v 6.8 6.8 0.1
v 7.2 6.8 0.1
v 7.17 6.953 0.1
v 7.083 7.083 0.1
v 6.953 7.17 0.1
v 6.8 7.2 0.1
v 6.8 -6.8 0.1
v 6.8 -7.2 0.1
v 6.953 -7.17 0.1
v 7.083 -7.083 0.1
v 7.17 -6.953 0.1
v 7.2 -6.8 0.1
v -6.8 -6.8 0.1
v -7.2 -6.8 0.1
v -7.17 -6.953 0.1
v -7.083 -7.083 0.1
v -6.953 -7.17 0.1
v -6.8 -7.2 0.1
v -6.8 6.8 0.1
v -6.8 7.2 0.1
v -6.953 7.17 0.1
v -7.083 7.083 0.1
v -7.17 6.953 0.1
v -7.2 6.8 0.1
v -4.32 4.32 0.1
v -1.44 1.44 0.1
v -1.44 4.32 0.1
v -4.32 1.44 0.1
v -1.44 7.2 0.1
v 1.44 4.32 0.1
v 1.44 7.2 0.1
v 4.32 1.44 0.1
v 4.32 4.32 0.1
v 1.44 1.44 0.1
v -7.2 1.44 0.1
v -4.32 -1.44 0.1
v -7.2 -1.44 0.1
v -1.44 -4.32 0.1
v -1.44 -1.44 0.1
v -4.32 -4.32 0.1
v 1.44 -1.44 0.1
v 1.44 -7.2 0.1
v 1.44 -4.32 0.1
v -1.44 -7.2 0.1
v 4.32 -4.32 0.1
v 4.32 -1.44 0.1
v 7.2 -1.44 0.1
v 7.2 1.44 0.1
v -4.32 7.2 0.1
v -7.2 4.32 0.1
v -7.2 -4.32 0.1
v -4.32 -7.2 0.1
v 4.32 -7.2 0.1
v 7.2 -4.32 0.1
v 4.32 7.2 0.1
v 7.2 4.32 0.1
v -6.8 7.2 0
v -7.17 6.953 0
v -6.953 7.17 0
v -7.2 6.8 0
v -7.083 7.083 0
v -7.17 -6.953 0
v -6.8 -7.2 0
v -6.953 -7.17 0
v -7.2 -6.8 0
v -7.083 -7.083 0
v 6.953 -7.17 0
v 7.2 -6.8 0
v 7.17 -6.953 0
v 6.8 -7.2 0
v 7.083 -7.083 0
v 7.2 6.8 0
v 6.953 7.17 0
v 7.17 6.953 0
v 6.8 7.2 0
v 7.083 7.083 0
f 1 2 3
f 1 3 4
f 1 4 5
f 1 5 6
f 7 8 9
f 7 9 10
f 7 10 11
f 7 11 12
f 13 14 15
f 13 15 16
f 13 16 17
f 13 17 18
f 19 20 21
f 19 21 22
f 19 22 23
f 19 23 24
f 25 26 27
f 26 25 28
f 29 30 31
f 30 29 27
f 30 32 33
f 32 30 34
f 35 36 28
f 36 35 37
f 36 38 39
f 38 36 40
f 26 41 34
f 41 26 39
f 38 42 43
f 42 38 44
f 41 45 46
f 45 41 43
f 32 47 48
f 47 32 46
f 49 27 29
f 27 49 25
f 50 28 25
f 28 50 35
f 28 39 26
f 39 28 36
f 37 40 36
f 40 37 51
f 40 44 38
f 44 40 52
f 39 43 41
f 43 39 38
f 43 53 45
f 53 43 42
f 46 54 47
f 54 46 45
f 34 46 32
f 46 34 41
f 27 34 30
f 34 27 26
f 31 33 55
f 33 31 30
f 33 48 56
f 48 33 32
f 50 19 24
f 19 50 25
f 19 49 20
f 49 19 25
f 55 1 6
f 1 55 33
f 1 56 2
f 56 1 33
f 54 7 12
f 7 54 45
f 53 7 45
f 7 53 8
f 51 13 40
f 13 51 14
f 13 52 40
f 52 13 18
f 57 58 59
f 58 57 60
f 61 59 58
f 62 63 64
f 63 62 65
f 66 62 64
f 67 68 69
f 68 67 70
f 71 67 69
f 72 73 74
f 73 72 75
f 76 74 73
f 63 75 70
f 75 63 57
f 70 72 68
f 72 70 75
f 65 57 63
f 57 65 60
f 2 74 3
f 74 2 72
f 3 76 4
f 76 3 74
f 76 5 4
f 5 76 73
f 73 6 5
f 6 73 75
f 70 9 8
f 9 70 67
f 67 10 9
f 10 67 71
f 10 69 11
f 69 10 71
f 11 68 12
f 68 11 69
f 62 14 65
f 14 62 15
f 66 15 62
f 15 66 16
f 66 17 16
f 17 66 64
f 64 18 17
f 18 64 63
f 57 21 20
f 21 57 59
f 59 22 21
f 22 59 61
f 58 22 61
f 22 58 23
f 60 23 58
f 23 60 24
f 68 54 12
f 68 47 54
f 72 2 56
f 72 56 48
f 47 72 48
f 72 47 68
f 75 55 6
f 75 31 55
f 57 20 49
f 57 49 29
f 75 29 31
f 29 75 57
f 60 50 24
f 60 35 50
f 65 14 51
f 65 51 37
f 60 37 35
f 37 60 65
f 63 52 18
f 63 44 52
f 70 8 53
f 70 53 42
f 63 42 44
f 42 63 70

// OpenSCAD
// file: ../p/1-4disc.scad
use <../lib.scad>
function ldraw_lib__1_4disc() = [
// 0 Disc 0.25
// 0 Name: 1-4disc.dat
// 0 Author: James Jessiman
// 0 !LDRAW_ORG Primitive UPDATE 2002-02
// 0 !LICENSE Licensed under CC BY 4.0 : see CAreadme.txt
// 
// 0 BFC CERTIFY CCW
  [0,"BFC","CERTIFY"],
  [0,"BFC","CCW"],
// 
// 0 !HISTORY 2002-03-23 [sbliss] Added BFC statement.
// 0 !HISTORY 2002-04-25 [PTadmin] Official Update 2002-02
// 0 !HISTORY 2007-06-22 [PTadmin] Header formatted for Contributor Agreement
// 0 !HISTORY 2008-07-01 [PTadmin] Official Update 2008-01
// 
// 
// 3 16 0 0 0 1 0 0 0.9239 0 0.3827
  [3,16,0,0,0,1,0,0,0.9239,0,0.3827],
// 3 16 0 0 0 0.9239 0 0.3827 0.7071 0 0.7071
  [3,16,0,0,0,0.9239,0,0.3827,0.7071,0,0.7071],
// 3 16 0 0 0 0.7071 0 0.7071 0.3827 0 0.9239
  [3,16,0,0,0,0.7071,0,0.7071,0.3827,0,0.9239],
// 3 16 0 0 0 0.3827 0 0.9239 0 0 1
  [3,16,0,0,0,0.3827,0,0.9239,0,0,1],
// 0
];
module ldraw_lib__1_4disc(step=0, col=false, unit=2/5, alt=false, line=0.2, solid=!$preview)
    makepoly(ldraw_lib__1_4disc(), step=step, col=col, unit=unit, alt=alt, line=line, solid=solid);
ldraw_lib__1_4disc(line=0.2);
// file: ../p/1-4cyli.scad
use <../lib.scad>
function ldraw_lib__1_4cyli() = [
// 0 Cylinder 0.25
// 0 Name: 1-4cyli.dat
// 0 Author: James Jessiman
// 0 !LDRAW_ORG Primitive UPDATE 2012-01
// 0 !LICENSE Licensed under CC BY 4.0 : see CAreadme.txt
// 
// 0 BFC CERTIFY CCW
  [0,"BFC","CERTIFY"],
  [0,"BFC","CCW"],
// 
// 0 !HISTORY 2002-03-23 [sbliss] Added BFC statement.
// 0 !HISTORY 2002-04-25 [PTadmin] Official Update 2002-02
// 0 !HISTORY 2007-06-22 [PTadmin] Header formatted for Contributor Agreement
// 0 !HISTORY 2008-07-01 [PTadmin] Official Update 2008-01
// 0 !HISTORY 2012-02-16 [Philo] Changed to CCW
// 0 !HISTORY 2012-03-30 [PTadmin] Official Update 2012-01
// 
// 
// 4 16 1 1 0 0.9239 1 0.3827 0.9239 0 0.3827 1 0 0
  [4,16,1,1,0,0.9239,1,0.3827,0.9239,0,0.3827,1,0,0],
// 5 24 1 0 0 1 1 0 0.9239 0 0.3827 1 0 -1
  [5,24,1,0,0,1,1,0,0.9239,0,0.3827,1,0,-1],
// 4 16 0.9239 1 0.3827 0.7071 1 0.7071 0.7071 0 0.7071 0.9239 0 0.3827
  [4,16,0.9239,1,0.3827,0.7071,1,0.7071,0.7071,0,0.7071,0.9239,0,0.3827],
// 5 24 0.9239 0 0.3827 0.9239 1 0.3827 0.7071 0 0.7071 1 0 0
  [5,24,0.9239,0,0.3827,0.9239,1,0.3827,0.7071,0,0.7071,1,0,0],
// 4 16 0.7071 1 0.7071 0.3827 1 0.9239 0.3827 0 0.9239 0.7071 0 0.7071
  [4,16,0.7071,1,0.7071,0.3827,1,0.9239,0.3827,0,0.9239,0.7071,0,0.7071],
// 5 24 0.7071 0 0.7071 0.7071 1 0.7071 0.3827 0 0.9239 0.9239 0 0.3827
  [5,24,0.7071,0,0.7071,0.7071,1,0.7071,0.3827,0,0.9239,0.9239,0,0.3827],
// 4 16 0.3827 1 0.9239 0 1 1 0 0 1 0.3827 0 0.9239
  [4,16,0.3827,1,0.9239,0,1,1,0,0,1,0.3827,0,0.9239],
// 5 24 0.3827 0 0.9239 0.3827 1 0.9239 0 0 1 0.7071 0 0.7071
  [5,24,0.3827,0,0.9239,0.3827,1,0.9239,0,0,1,0.7071,0,0.7071],
// 5 24 0 0 1 0 1 1 0.3827 0 0.9239 -1 0 1
  [5,24,0,0,1,0,1,1,0.3827,0,0.9239,-1,0,1],
];
module ldraw_lib__1_4cyli(step=0, col=false, unit=2/5, alt=false, line=0.2, solid=!$preview)
    makepoly(ldraw_lib__1_4cyli(), step=step, col=col, unit=unit, alt=alt, line=line, solid=solid);
ldraw_lib__1_4cyli(line=0.2);
// file: ../p/1-4chrd.scad
use <../lib.scad>
function ldraw_lib__1_4chrd() = [
// 0 Chord 0.25
// 0 Name: 1-4chrd.dat
// 0 Author: Tony Hafner [hafhead]
// 0 !LDRAW_ORG Primitive UPDATE 2012-02
// 0 !LICENSE Licensed under CC BY 2.0 and CC BY 4.0 : see CAreadme.txt
// 
// 0 BFC CERTIFY CCW
  [0,"BFC","CERTIFY"],
  [0,"BFC","CCW"],
// 
// 0 !HISTORY 2004-04-22 [PTadmin] Official Update 2004-02
// 0 !HISTORY 2007-10-09 [PTadmin] Header formatted for Contributor Agreement
// 0 !HISTORY 2008-07-01 [PTadmin] Official Update 2008-01
// 0 !HISTORY 2012-08-02 [MMR1988] Re-creation with PrimGen2 and Rectifier
// 0 !HISTORY 2012-08-09 [PTadmin] Official Update 2012-02
// 
// 
// 4 16 0.9239 0 0.3827 0.3827 0 0.9239 0 0 1 1 0 0
  [4,16,0.9239,0,0.3827,0.3827,0,0.9239,0,0,1,1,0,0],
// 3 16 0.7071 0 0.7071 0.3827 0 0.9239 0.9239 0 0.3827
  [3,16,0.7071,0,0.7071,0.3827,0,0.9239,0.9239,0,0.3827],
];
module ldraw_lib__1_4chrd(step=0, col=false, unit=2/5, alt=false, line=0.2, solid=!$preview)
    makepoly(ldraw_lib__1_4chrd(), step=step, col=col, unit=unit, alt=alt, line=line, solid=solid);
ldraw_lib__1_4chrd(line=0.2);
// main file
use <../lib.scad>
use <../p/1-4chrd.scad>
use <../p/1-4cyli.scad>
use <../p/1-4disc.scad>
function ldraw_lib__4624296a() = [
// 0 Sticker  1.8 x  1.8 with Black and White Squares
// 0 Name: 4624296a.dat
// 0 Author: Damien Roux [Darats]
// 0 !LDRAW_ORG Part UPDATE 2017-01
// 0 !LICENSE Licensed under CC BY 4.0 : see CAreadme.txt
// 
// 0 BFC CERTIFY CCW
  [0,"BFC","CERTIFY"],
  [0,"BFC","CCW"],
// 
// 0 !KEYWORDS Cars, Disney, Set 8206
// 
// 0 !HISTORY 2014-06-21 [PTadmin] Official Update 2014-01
// 0 !HISTORY 2017-07-03 [cwdee] Use cylinder primitives with conditional lines
// 0 !HISTORY 2017-12-30 [PTadmin] Official Update 2017-01
// 
// 
// 1 0 17 -0.25 17 1 0 0 0 1 0 0 0 1 1-4disc.dat
  [1,0,17,-0.25,17,1,0,0,0,1,0,0,0,1, ldraw_lib__1_4disc()],
// 1 0 17 -0.25 -17 0 0 1 0 1 0 -1 0 0 1-4disc.dat
  [1,0,17,-0.25,-17,0,0,1,0,1,0,-1,0,0, ldraw_lib__1_4disc()],
// 1 0 -17 -0.25 -17 -1 0 0 0 1 0 0 0 -1 1-4disc.dat
  [1,0,-17,-0.25,-17,-1,0,0,0,1,0,0,0,-1, ldraw_lib__1_4disc()],
// 1 0 -17 -0.25 17 0 0 -1 0 1 0 1 0 0 1-4disc.dat
  [1,0,-17,-0.25,17,0,0,-1,0,1,0,1,0,0, ldraw_lib__1_4disc()],
// 
// 4 0 -3.6 -0.25 10.8 -10.8 -0.25 10.8 -10.8 -0.25 3.6 -3.6 -0.25 3.6
  [4,0,-3.6,-0.25,10.8,-10.8,-0.25,10.8,-10.8,-0.25,3.6,-3.6,-0.25,3.6],
// 4 0 3.6 -0.25 18 -3.6 -0.25 18 -3.6 -0.25 10.8 3.6 -0.25 10.8
  [4,0,3.6,-0.25,18,-3.6,-0.25,18,-3.6,-0.25,10.8,3.6,-0.25,10.8],
// 4 0 10.8 -0.25 10.8 3.6 -0.25 10.8 3.6 -0.25 3.6 10.8 -0.25 3.6
  [4,0,10.8,-0.25,10.8,3.6,-0.25,10.8,3.6,-0.25,3.6,10.8,-0.25,3.6],
// 4 0 -10.8 -0.25 3.6 -18 -0.25 3.6 -18 -0.25 -3.6 -10.8 -0.25 -3.6
  [4,0,-10.8,-0.25,3.6,-18,-0.25,3.6,-18,-0.25,-3.6,-10.8,-0.25,-3.6],
// 4 0 -3.6 -0.25 -3.6 -10.8 -0.25 -3.6 -10.8 -0.25 -10.8 -3.6 -0.25 -10.8
  [4,0,-3.6,-0.25,-3.6,-10.8,-0.25,-3.6,-10.8,-0.25,-10.8,-3.6,-0.25,-10.8],
// 4 0 3.6 -0.25 3.6 -3.6 -0.25 3.6 -3.6 -0.25 -3.6 3.6 -0.25 -3.6
  [4,0,3.6,-0.25,3.6,-3.6,-0.25,3.6,-3.6,-0.25,-3.6,3.6,-0.25,-3.6],
// 4 0 3.6 -0.25 -10.8 -3.6 -0.25 -10.8 -3.6 -0.25 -18 3.6 -0.25 -18
  [4,0,3.6,-0.25,-10.8,-3.6,-0.25,-10.8,-3.6,-0.25,-18,3.6,-0.25,-18],
// 4 0 10.8 -0.25 -3.6 3.6 -0.25 -3.6 3.6 -0.25 -10.8 10.8 -0.25 -10.8
  [4,0,10.8,-0.25,-3.6,3.6,-0.25,-3.6,3.6,-0.25,-10.8,10.8,-0.25,-10.8],
// 4 0 18 -0.25 3.6 10.8 -0.25 3.6 10.8 -0.25 -3.6 18 -0.25 -3.6
  [4,0,18,-0.25,3.6,10.8,-0.25,3.6,10.8,-0.25,-3.6,18,-0.25,-3.6],
// 4 15 -3.6 -0.25 18 -10.8 -0.25 18 -10.8 -0.25 10.8 -3.6 -0.25 10.8
  [4,15,-3.6,-0.25,18,-10.8,-0.25,18,-10.8,-0.25,10.8,-3.6,-0.25,10.8],
// 4 15 -10.8 -0.25 10.8 -18 -0.25 10.8 -18 -0.25 3.6 -10.8 -0.25 3.6
  [4,15,-10.8,-0.25,10.8,-18,-0.25,10.8,-18,-0.25,3.6,-10.8,-0.25,3.6],
// 4 15 -3.6 -0.25 3.6 -10.8 -0.25 3.6 -10.8 -0.25 -3.6 -3.6 -0.25 -3.6
  [4,15,-3.6,-0.25,3.6,-10.8,-0.25,3.6,-10.8,-0.25,-3.6,-3.6,-0.25,-3.6],
// 4 15 -10.8 -0.25 -3.6 -18 -0.25 -3.6 -18 -0.25 -10.8 -10.8 -0.25 -10.8
  [4,15,-10.8,-0.25,-3.6,-18,-0.25,-3.6,-18,-0.25,-10.8,-10.8,-0.25,-10.8],
// 4 15 -3.6 -0.25 -10.8 -10.8 -0.25 -10.8 -10.8 -0.25 -18 -3.6 -0.25 -18
  [4,15,-3.6,-0.25,-10.8,-10.8,-0.25,-10.8,-10.8,-0.25,-18,-3.6,-0.25,-18],
// 4 15 3.6 -0.25 -3.6 -3.6 -0.25 -3.6 -3.6 -0.25 -10.8 3.6 -0.25 -10.8
  [4,15,3.6,-0.25,-3.6,-3.6,-0.25,-3.6,-3.6,-0.25,-10.8,3.6,-0.25,-10.8],
// 4 15 10.8 -0.25 -10.8 3.6 -0.25 -10.8 3.6 -0.25 -18 10.8 -0.25 -18
  [4,15,10.8,-0.25,-10.8,3.6,-0.25,-10.8,3.6,-0.25,-18,10.8,-0.25,-18],
// 4 15 18 -0.25 -3.6 10.8 -0.25 -3.6 10.8 -0.25 -10.8 18 -0.25 -10.8
  [4,15,18,-0.25,-3.6,10.8,-0.25,-3.6,10.8,-0.25,-10.8,18,-0.25,-10.8],
// 4 15 10.8 -0.25 3.6 3.6 -0.25 3.6 3.6 -0.25 -3.6 10.8 -0.25 -3.6
  [4,15,10.8,-0.25,3.6,3.6,-0.25,3.6,3.6,-0.25,-3.6,10.8,-0.25,-3.6],
// 4 15 3.6 -0.25 10.8 -3.6 -0.25 10.8 -3.6 -0.25 3.6 3.6 -0.25 3.6
  [4,15,3.6,-0.25,10.8,-3.6,-0.25,10.8,-3.6,-0.25,3.6,3.6,-0.25,3.6],
// 4 15 10.8 -0.25 18 3.6 -0.25 18 3.6 -0.25 10.8 10.8 -0.25 10.8
  [4,15,10.8,-0.25,18,3.6,-0.25,18,3.6,-0.25,10.8,10.8,-0.25,10.8],
// 4 15 18 -0.25 10.8 10.8 -0.25 10.8 10.8 -0.25 3.6 18 -0.25 3.6
  [4,15,18,-0.25,10.8,10.8,-0.25,10.8,10.8,-0.25,3.6,18,-0.25,3.6],
// 4 0 -17 -0.25 17 -18 -0.25 17 -18 -0.25 10.8 -10.8 -0.25 10.8
  [4,0,-17,-0.25,17,-18,-0.25,17,-18,-0.25,10.8,-10.8,-0.25,10.8],
// 4 0 -10.8 -0.25 18 -17 -0.25 18 -17 -0.25 17 -10.8 -0.25 10.8
  [4,0,-10.8,-0.25,18,-17,-0.25,18,-17,-0.25,17,-10.8,-0.25,10.8],
// 4 0 10.8 -0.25 18 10.8 -0.25 10.8 17 -0.25 17 17 -0.25 18
  [4,0,10.8,-0.25,18,10.8,-0.25,10.8,17,-0.25,17,17,-0.25,18],
// 4 0 17 -0.25 17 10.8 -0.25 10.8 18 -0.25 10.8 18 -0.25 17
  [4,0,17,-0.25,17,10.8,-0.25,10.8,18,-0.25,10.8,18,-0.25,17],
// 4 0 17 -0.25 -17 18 -0.25 -17 18 -0.25 -10.8 10.8 -0.25 -10.8
  [4,0,17,-0.25,-17,18,-0.25,-17,18,-0.25,-10.8,10.8,-0.25,-10.8],
// 4 0 17 -0.25 -17 10.8 -0.25 -10.8 10.8 -0.25 -18 17 -0.25 -18
  [4,0,17,-0.25,-17,10.8,-0.25,-10.8,10.8,-0.25,-18,17,-0.25,-18],
// 4 0 -18 -0.25 -10.8 -18 -0.25 -17 -17 -0.25 -17 -10.8 -0.25 -10.8
  [4,0,-18,-0.25,-10.8,-18,-0.25,-17,-17,-0.25,-17,-10.8,-0.25,-10.8],
// 4 0 -10.8 -0.25 -18 -10.8 -0.25 -10.8 -17 -0.25 -17 -17 -0.25 -18
  [4,0,-10.8,-0.25,-18,-10.8,-0.25,-10.8,-17,-0.25,-17,-17,-0.25,-18],
// 
// 1 16 -17 0 17 -1 0 0 0 -1 0 0 0 1 1-4chrd.dat
  [1,16,-17,0,17,-1,0,0,0,-1,0,0,0,1, ldraw_lib__1_4chrd()],
// 1 16 -17 0 -17 0 0 -1 0 -1 0 -1 0 0 1-4chrd.dat
  [1,16,-17,0,-17,0,0,-1,0,-1,0,-1,0,0, ldraw_lib__1_4chrd()],
// 1 16 17 0 -17 1 0 0 0 -1 0 0 0 -1 1-4chrd.dat
  [1,16,17,0,-17,1,0,0,0,-1,0,0,0,-1, ldraw_lib__1_4chrd()],
// 1 16 17 0 17 0 0 1 0 -1 0 1 0 0 1-4chrd.dat
  [1,16,17,0,17,0,0,1,0,-1,0,1,0,0, ldraw_lib__1_4chrd()],
// 
// 4 16 17 0 18 17 0 -18 -17 0 -18 -17 0 18
  [4,16,17,0,18,17,0,-18,-17,0,-18,-17,0,18],
// 4 16 18 0 17 18 0 -17 17 0 -18 17 0 18
  [4,16,18,0,17,18,0,-17,17,0,-18,17,0,18],
// 4 16 -17 0 18 -17 0 -18 -18 0 -17 -18 0 17
  [4,16,-17,0,18,-17,0,-18,-18,0,-17,-18,0,17],
// 
// 1 16 17 -0.25 17 1 0 0 0 0.25 0 0 0 1 1-4cyli.dat
  [1,16,17,-0.25,17,1,0,0,0,0.25,0,0,0,1, ldraw_lib__1_4cyli()],
// 1 16 17 -0.25 -17 0 0 1 0 0.25 0 -1 0 0 1-4cyli.dat
  [1,16,17,-0.25,-17,0,0,1,0,0.25,0,-1,0,0, ldraw_lib__1_4cyli()],
// 1 16 -17 -0.25 -17 -1 0 0 0 0.25 0 0 0 -1 1-4cyli.dat
  [1,16,-17,-0.25,-17,-1,0,0,0,0.25,0,0,0,-1, ldraw_lib__1_4cyli()],
// 1 16 -17 -0.25 17 0 0 -1 0 0.25 0 1 0 0 1-4cyli.dat
  [1,16,-17,-0.25,17,0,0,-1,0,0.25,0,1,0,0, ldraw_lib__1_4cyli()],
// 
// 3 16 18 0 -17 18 -0.25 -10.8 18 -0.25 -17
  [3,16,18,0,-17,18,-0.25,-10.8,18,-0.25,-17],
// 3 16 18 0 -17 18 -0.25 -3.6 18 -0.25 -10.8
  [3,16,18,0,-17,18,-0.25,-3.6,18,-0.25,-10.8],
// 3 16 18 0 17 18 -0.25 17 18 -0.25 10.8
  [3,16,18,0,17,18,-0.25,17,18,-0.25,10.8],
// 3 16 18 0 17 18 -0.25 10.8 18 -0.25 3.6
  [3,16,18,0,17,18,-0.25,10.8,18,-0.25,3.6],
// 4 16 18 0 -17 18 0 17 18 -0.25 3.6 18 -0.25 -3.6
  [4,16,18,0,-17,18,0,17,18,-0.25,3.6,18,-0.25,-3.6],
// 3 16 17 0 18 10.8 -0.25 18 17 -0.25 18
  [3,16,17,0,18,10.8,-0.25,18,17,-0.25,18],
// 3 16 17 0 18 3.6 -0.25 18 10.8 -0.25 18
  [3,16,17,0,18,3.6,-0.25,18,10.8,-0.25,18],
// 3 16 -17 0 18 -17 -0.25 18 -10.8 -0.25 18
  [3,16,-17,0,18,-17,-0.25,18,-10.8,-0.25,18],
// 3 16 -17 0 18 -10.8 -0.25 18 -3.6 -0.25 18
  [3,16,-17,0,18,-10.8,-0.25,18,-3.6,-0.25,18],
// 4 16 17 0 18 -17 0 18 -3.6 -0.25 18 3.6 -0.25 18
  [4,16,17,0,18,-17,0,18,-3.6,-0.25,18,3.6,-0.25,18],
// 3 16 -18 0 17 -18 -0.25 10.8 -18 -0.25 17
  [3,16,-18,0,17,-18,-0.25,10.8,-18,-0.25,17],
// 3 16 -18 0 17 -18 -0.25 3.6 -18 -0.25 10.8
  [3,16,-18,0,17,-18,-0.25,3.6,-18,-0.25,10.8],
// 3 16 -18 0 -17 -18 -0.25 -17 -18 -0.25 -10.8
  [3,16,-18,0,-17,-18,-0.25,-17,-18,-0.25,-10.8],
// 3 16 -18 0 -17 -18 -0.25 -10.8 -18 -0.25 -3.6
  [3,16,-18,0,-17,-18,-0.25,-10.8,-18,-0.25,-3.6],
// 4 16 -18 0 17 -18 0 -17 -18 -0.25 -3.6 -18 -0.25 3.6
  [4,16,-18,0,17,-18,0,-17,-18,-0.25,-3.6,-18,-0.25,3.6],
// 3 16 -17 0 -18 -10.8 -0.25 -18 -17 -0.25 -18
  [3,16,-17,0,-18,-10.8,-0.25,-18,-17,-0.25,-18],
// 3 16 -17 0 -18 -3.6 -0.25 -18 -10.8 -0.25 -18
  [3,16,-17,0,-18,-3.6,-0.25,-18,-10.8,-0.25,-18],
// 3 16 17 0 -18 17 -0.25 -18 10.8 -0.25 -18
  [3,16,17,0,-18,17,-0.25,-18,10.8,-0.25,-18],
// 3 16 17 0 -18 10.8 -0.25 -18 3.6 -0.25 -18
  [3,16,17,0,-18,10.8,-0.25,-18,3.6,-0.25,-18],
// 4 16 -17 0 -18 17 0 -18 3.6 -0.25 -18 -3.6 -0.25 -18
  [4,16,-17,0,-18,17,0,-18,3.6,-0.25,-18,-3.6,-0.25,-18],
];
module ldraw_lib__4624296a(step=0, col=false, unit=2/5, alt=false, line=0.2, solid=!$preview)
    makepoly(ldraw_lib__4624296a(), step=step, col=col, unit=unit, alt=alt, line=line, solid=solid);
ldraw_lib__4624296a(line=0.2);
